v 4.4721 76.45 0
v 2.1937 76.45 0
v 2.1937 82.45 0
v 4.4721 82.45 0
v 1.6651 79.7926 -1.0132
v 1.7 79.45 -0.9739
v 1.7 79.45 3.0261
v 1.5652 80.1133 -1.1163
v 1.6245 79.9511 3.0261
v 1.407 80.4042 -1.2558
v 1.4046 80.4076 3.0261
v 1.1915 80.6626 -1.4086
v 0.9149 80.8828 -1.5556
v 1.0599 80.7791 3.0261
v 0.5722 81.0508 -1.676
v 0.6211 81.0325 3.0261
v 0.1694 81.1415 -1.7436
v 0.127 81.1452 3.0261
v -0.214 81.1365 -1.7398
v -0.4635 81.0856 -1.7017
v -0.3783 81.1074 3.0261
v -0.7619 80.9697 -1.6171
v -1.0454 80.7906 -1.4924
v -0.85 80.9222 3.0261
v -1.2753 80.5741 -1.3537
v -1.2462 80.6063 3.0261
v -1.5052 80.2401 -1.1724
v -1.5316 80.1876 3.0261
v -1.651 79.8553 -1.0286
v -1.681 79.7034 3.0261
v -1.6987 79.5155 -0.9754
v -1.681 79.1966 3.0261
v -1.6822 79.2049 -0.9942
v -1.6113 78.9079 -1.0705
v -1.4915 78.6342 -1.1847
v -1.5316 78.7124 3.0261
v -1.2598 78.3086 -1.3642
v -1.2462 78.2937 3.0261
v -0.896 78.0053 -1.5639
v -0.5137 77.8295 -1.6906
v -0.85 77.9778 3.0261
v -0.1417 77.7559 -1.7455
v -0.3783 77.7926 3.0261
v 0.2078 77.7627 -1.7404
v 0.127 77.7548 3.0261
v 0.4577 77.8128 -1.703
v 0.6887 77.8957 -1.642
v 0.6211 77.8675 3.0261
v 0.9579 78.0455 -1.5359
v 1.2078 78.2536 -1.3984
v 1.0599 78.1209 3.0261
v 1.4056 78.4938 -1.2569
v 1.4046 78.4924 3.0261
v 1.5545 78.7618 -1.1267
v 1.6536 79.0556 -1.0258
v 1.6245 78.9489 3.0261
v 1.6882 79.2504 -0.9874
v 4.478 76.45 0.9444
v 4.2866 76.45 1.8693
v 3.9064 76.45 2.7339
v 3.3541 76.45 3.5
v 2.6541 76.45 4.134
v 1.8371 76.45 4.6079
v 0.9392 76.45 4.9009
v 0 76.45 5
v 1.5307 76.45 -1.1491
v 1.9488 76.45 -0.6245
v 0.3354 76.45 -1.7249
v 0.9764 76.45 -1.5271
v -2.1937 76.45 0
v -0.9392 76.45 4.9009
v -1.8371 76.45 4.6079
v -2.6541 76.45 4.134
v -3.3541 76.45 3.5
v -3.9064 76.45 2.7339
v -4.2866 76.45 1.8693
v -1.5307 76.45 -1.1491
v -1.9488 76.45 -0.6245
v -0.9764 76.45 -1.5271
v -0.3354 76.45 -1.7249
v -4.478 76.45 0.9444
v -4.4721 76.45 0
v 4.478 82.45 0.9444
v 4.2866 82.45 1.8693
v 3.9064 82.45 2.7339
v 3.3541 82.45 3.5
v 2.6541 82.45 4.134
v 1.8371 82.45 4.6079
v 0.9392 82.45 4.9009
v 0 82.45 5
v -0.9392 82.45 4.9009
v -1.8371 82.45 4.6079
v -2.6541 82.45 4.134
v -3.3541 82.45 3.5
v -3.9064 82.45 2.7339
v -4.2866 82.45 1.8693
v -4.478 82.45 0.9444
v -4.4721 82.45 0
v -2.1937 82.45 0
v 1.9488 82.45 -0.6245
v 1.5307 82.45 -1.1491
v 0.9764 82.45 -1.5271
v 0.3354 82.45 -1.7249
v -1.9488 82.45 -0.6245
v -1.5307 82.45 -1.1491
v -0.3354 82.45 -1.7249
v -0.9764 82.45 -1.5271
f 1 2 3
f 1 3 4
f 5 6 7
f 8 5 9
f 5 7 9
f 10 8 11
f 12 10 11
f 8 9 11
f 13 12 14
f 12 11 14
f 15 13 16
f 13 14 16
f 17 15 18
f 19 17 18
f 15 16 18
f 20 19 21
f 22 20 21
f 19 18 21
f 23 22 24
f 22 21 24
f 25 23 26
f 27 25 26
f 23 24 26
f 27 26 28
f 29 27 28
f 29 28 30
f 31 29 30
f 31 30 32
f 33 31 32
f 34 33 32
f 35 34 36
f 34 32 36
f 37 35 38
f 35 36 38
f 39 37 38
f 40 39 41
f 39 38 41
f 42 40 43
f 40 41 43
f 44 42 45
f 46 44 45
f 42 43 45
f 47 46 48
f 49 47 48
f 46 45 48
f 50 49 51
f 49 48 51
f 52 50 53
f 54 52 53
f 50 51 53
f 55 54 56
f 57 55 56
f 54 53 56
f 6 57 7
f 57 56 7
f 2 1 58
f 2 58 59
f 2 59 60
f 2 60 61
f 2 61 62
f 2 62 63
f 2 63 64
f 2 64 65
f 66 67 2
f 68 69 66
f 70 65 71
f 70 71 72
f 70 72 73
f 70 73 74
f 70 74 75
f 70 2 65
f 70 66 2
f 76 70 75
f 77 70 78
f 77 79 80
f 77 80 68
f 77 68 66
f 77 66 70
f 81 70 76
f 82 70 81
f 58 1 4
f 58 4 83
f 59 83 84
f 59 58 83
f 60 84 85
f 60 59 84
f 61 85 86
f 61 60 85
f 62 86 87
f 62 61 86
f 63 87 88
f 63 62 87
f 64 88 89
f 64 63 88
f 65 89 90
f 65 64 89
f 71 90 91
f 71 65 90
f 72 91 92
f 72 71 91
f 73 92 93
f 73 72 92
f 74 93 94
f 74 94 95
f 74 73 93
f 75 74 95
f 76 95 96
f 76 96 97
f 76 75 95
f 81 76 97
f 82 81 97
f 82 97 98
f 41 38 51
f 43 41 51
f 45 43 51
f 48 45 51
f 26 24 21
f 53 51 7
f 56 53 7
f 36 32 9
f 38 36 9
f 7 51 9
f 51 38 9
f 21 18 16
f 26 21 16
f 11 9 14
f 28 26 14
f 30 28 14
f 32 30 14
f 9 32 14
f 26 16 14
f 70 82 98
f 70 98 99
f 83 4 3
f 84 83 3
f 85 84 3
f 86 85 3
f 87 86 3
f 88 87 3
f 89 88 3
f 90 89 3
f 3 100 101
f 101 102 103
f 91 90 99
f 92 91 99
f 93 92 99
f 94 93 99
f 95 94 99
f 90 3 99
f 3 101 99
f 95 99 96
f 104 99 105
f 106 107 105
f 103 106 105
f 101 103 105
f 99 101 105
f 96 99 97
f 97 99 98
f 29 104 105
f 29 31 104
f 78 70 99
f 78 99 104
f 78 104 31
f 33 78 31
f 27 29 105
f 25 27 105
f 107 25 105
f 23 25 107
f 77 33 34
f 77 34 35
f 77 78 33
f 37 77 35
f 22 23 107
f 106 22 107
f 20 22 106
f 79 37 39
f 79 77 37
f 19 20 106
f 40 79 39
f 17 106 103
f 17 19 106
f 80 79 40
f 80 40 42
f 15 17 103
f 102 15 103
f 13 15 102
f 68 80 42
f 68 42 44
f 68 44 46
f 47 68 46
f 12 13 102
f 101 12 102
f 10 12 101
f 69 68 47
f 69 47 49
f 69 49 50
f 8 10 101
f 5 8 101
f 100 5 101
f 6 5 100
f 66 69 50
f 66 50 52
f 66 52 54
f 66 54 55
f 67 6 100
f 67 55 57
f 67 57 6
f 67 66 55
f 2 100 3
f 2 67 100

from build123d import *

# Parameters (mm, degrees)
AUFSATZ_LINEAR_START            = 0.5
AUFSATZ_LINEAR_AUSTRAGEN1_DEPTH = 6


with BuildPart() as part:
    # Skizze2 → Aufsatz-Linear austragen1 (new body)
    with BuildSketch(Plane(origin=(0, 75.95, 0), x_dir=(1, 0, 0), z_dir=(0, 1, 0)).offset(AUFSATZ_LINEAR_START)):
        with BuildLine():
            Line((-4.472135955, 0), (-2.193741097, 0))
            ThreePointArc((-2.193741097, 0), (0, 1.75), (2.193741097, 0))
            Line((2.193741097, 0), (4.472135955, 0))
            ThreePointArc((4.472135955, 0), (0, -5), (-4.472135955, 0))
        make_face()
    extrude(amount=AUFSATZ_LINEAR_AUSTRAGEN1_DEPTH)

    # Skizze6 → Schnitt-Rotation4 (revolve, cut)
    with BuildSketch(Plane(origin=(0, 79.45, 0), x_dir=(-1, 0, 0), z_dir=(0, -1, 0))):
        Polygon((-1.7, 0.973940297), (-1.7, -3.026059703), (0, -3.026059703), (0, 1.75), (0, 1.9), (-1.7, 1.9), align=None)
    revolve(axis=Axis((0, 79.45, -1.75), (0, 0, 1)), mode=Mode.SUBTRACT)


solid = part.part
